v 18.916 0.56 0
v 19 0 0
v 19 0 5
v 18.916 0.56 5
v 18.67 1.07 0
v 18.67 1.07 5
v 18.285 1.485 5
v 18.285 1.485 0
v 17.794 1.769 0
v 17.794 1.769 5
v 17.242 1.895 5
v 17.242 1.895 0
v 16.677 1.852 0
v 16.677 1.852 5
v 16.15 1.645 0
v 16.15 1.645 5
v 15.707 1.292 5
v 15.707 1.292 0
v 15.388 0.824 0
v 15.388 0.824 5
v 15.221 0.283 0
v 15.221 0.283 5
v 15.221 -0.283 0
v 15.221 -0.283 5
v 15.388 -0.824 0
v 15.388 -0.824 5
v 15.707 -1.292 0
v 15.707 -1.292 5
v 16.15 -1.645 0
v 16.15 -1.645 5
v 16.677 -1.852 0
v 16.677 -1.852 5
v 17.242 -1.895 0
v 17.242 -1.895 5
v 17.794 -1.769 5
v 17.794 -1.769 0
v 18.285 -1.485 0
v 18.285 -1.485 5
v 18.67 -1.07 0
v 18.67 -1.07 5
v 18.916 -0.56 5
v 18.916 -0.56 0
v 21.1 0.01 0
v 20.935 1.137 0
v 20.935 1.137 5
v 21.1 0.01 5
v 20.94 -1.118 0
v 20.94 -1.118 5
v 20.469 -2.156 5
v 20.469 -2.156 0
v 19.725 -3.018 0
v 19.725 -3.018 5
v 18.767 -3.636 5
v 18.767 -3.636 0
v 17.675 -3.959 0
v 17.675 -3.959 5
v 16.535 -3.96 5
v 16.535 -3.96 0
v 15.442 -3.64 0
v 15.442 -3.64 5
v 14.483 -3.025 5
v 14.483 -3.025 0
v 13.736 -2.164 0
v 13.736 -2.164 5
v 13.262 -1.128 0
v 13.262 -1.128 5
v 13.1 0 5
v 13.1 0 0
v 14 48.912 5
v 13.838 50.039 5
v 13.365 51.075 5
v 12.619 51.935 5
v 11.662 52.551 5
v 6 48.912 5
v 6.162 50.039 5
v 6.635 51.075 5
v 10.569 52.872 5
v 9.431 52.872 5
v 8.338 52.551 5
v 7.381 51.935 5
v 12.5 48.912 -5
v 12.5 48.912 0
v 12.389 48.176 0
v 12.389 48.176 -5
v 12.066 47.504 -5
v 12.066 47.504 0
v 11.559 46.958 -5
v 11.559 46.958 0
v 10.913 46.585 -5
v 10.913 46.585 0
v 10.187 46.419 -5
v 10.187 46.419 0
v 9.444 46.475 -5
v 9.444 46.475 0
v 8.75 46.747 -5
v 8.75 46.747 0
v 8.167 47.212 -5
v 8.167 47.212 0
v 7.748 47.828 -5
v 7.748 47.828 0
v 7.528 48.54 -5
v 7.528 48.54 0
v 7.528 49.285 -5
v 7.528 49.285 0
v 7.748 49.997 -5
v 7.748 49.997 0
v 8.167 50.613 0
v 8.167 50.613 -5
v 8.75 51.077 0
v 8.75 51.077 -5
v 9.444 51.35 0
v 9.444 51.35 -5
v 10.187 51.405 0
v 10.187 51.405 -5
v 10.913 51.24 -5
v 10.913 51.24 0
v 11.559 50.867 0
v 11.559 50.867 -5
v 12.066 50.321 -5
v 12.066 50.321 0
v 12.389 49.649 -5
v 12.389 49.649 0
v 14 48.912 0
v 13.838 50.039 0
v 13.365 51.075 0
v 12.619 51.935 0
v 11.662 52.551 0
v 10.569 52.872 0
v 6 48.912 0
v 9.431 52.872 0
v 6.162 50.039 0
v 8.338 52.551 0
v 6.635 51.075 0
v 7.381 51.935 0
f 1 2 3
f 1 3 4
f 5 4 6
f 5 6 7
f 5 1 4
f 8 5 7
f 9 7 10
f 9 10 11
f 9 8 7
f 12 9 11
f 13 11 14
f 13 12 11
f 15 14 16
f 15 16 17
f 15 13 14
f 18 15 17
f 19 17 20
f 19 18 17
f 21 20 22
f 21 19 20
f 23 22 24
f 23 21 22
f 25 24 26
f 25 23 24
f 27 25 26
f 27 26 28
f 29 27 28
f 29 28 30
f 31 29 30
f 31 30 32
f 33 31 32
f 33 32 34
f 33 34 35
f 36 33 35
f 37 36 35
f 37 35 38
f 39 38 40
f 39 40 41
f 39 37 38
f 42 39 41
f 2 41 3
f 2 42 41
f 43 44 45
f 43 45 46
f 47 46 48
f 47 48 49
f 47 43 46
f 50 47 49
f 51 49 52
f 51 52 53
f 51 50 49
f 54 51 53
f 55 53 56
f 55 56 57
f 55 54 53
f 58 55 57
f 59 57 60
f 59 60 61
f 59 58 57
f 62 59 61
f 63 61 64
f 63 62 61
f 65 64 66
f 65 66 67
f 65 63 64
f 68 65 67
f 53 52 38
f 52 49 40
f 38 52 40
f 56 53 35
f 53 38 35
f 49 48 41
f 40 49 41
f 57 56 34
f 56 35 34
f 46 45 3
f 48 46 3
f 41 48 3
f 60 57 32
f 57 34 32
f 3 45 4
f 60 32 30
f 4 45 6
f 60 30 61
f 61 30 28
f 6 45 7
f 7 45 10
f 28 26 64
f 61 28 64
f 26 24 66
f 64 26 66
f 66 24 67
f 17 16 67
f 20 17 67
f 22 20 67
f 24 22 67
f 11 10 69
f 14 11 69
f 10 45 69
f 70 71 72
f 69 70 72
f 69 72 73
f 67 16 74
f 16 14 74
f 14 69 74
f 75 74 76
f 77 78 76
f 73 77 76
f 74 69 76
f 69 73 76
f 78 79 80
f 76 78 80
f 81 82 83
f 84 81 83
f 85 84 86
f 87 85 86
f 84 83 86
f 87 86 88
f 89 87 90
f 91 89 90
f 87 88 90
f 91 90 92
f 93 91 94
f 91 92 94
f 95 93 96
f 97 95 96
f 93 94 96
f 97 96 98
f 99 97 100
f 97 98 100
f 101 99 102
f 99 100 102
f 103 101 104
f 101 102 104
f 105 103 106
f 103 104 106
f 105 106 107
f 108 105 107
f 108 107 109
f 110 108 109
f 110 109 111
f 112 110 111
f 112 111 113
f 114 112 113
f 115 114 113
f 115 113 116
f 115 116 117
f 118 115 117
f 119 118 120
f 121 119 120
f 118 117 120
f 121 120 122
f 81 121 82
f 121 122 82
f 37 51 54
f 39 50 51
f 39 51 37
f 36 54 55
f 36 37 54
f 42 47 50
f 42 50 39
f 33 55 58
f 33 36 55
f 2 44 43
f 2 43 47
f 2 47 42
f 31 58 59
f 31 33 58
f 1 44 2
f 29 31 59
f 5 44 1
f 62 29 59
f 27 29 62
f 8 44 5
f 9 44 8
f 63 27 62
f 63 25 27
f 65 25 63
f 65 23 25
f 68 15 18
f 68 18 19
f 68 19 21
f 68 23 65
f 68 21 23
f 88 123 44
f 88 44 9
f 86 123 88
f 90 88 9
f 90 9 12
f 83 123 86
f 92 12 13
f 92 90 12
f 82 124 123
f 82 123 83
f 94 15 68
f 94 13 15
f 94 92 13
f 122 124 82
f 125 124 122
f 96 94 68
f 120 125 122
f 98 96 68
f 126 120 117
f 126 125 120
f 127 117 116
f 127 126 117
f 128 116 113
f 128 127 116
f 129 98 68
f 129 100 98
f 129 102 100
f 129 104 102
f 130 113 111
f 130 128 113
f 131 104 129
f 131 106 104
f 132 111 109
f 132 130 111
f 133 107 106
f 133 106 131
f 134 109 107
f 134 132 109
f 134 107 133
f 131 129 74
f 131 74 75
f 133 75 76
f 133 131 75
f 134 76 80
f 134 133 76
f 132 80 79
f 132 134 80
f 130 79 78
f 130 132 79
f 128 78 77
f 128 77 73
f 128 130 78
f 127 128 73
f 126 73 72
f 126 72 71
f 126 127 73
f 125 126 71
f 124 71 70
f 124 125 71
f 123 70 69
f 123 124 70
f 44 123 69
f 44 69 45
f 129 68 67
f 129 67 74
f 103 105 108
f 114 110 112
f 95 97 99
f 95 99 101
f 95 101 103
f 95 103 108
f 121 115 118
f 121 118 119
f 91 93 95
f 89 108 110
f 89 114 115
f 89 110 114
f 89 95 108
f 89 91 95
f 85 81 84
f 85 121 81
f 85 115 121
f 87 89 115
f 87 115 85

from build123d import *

# Parameters (mm, degrees)
SKETCH1_R           = 1.9
BOSS_EXTRUDE1_DEPTH = 5
SKETCH2_R           = 2.5
BOSS_EXTRUDE2_DEPTH = 5


with BuildPart() as part:
    # Sketch1 → Boss-Extrude1 (new body)
    with BuildSketch(Plane.XY):
        with BuildLine():
            Line((13.1, 0), (6, 48.912409848))
            ThreePointArc((6, 48.912409848), (10, 52.912409848), (14, 48.912409848))
            Line((14, 48.912409848), (20.934913045, 1.137295889))
            ThreePointArc((20.934913045, 1.137295889), (17.674607614, -3.958513116), (13.1, 0))
        make_face()
        with Locations((17.1, 0)):
            Circle(SKETCH1_R, mode=Mode.SUBTRACT)
    extrude(amount=BOSS_EXTRUDE1_DEPTH)

    # Sketch2 → Boss-Extrude2 (add)
    with BuildSketch(Plane(origin=(0, 0, 0), x_dir=(-1, 0, 0), z_dir=(0, 0, -1))):
        with Locations(Location((-10, 48.912409848, 0), (0, 0, 180))):
            Circle(SKETCH2_R)
    extrude(amount=BOSS_EXTRUDE2_DEPTH)


solid = part.part
